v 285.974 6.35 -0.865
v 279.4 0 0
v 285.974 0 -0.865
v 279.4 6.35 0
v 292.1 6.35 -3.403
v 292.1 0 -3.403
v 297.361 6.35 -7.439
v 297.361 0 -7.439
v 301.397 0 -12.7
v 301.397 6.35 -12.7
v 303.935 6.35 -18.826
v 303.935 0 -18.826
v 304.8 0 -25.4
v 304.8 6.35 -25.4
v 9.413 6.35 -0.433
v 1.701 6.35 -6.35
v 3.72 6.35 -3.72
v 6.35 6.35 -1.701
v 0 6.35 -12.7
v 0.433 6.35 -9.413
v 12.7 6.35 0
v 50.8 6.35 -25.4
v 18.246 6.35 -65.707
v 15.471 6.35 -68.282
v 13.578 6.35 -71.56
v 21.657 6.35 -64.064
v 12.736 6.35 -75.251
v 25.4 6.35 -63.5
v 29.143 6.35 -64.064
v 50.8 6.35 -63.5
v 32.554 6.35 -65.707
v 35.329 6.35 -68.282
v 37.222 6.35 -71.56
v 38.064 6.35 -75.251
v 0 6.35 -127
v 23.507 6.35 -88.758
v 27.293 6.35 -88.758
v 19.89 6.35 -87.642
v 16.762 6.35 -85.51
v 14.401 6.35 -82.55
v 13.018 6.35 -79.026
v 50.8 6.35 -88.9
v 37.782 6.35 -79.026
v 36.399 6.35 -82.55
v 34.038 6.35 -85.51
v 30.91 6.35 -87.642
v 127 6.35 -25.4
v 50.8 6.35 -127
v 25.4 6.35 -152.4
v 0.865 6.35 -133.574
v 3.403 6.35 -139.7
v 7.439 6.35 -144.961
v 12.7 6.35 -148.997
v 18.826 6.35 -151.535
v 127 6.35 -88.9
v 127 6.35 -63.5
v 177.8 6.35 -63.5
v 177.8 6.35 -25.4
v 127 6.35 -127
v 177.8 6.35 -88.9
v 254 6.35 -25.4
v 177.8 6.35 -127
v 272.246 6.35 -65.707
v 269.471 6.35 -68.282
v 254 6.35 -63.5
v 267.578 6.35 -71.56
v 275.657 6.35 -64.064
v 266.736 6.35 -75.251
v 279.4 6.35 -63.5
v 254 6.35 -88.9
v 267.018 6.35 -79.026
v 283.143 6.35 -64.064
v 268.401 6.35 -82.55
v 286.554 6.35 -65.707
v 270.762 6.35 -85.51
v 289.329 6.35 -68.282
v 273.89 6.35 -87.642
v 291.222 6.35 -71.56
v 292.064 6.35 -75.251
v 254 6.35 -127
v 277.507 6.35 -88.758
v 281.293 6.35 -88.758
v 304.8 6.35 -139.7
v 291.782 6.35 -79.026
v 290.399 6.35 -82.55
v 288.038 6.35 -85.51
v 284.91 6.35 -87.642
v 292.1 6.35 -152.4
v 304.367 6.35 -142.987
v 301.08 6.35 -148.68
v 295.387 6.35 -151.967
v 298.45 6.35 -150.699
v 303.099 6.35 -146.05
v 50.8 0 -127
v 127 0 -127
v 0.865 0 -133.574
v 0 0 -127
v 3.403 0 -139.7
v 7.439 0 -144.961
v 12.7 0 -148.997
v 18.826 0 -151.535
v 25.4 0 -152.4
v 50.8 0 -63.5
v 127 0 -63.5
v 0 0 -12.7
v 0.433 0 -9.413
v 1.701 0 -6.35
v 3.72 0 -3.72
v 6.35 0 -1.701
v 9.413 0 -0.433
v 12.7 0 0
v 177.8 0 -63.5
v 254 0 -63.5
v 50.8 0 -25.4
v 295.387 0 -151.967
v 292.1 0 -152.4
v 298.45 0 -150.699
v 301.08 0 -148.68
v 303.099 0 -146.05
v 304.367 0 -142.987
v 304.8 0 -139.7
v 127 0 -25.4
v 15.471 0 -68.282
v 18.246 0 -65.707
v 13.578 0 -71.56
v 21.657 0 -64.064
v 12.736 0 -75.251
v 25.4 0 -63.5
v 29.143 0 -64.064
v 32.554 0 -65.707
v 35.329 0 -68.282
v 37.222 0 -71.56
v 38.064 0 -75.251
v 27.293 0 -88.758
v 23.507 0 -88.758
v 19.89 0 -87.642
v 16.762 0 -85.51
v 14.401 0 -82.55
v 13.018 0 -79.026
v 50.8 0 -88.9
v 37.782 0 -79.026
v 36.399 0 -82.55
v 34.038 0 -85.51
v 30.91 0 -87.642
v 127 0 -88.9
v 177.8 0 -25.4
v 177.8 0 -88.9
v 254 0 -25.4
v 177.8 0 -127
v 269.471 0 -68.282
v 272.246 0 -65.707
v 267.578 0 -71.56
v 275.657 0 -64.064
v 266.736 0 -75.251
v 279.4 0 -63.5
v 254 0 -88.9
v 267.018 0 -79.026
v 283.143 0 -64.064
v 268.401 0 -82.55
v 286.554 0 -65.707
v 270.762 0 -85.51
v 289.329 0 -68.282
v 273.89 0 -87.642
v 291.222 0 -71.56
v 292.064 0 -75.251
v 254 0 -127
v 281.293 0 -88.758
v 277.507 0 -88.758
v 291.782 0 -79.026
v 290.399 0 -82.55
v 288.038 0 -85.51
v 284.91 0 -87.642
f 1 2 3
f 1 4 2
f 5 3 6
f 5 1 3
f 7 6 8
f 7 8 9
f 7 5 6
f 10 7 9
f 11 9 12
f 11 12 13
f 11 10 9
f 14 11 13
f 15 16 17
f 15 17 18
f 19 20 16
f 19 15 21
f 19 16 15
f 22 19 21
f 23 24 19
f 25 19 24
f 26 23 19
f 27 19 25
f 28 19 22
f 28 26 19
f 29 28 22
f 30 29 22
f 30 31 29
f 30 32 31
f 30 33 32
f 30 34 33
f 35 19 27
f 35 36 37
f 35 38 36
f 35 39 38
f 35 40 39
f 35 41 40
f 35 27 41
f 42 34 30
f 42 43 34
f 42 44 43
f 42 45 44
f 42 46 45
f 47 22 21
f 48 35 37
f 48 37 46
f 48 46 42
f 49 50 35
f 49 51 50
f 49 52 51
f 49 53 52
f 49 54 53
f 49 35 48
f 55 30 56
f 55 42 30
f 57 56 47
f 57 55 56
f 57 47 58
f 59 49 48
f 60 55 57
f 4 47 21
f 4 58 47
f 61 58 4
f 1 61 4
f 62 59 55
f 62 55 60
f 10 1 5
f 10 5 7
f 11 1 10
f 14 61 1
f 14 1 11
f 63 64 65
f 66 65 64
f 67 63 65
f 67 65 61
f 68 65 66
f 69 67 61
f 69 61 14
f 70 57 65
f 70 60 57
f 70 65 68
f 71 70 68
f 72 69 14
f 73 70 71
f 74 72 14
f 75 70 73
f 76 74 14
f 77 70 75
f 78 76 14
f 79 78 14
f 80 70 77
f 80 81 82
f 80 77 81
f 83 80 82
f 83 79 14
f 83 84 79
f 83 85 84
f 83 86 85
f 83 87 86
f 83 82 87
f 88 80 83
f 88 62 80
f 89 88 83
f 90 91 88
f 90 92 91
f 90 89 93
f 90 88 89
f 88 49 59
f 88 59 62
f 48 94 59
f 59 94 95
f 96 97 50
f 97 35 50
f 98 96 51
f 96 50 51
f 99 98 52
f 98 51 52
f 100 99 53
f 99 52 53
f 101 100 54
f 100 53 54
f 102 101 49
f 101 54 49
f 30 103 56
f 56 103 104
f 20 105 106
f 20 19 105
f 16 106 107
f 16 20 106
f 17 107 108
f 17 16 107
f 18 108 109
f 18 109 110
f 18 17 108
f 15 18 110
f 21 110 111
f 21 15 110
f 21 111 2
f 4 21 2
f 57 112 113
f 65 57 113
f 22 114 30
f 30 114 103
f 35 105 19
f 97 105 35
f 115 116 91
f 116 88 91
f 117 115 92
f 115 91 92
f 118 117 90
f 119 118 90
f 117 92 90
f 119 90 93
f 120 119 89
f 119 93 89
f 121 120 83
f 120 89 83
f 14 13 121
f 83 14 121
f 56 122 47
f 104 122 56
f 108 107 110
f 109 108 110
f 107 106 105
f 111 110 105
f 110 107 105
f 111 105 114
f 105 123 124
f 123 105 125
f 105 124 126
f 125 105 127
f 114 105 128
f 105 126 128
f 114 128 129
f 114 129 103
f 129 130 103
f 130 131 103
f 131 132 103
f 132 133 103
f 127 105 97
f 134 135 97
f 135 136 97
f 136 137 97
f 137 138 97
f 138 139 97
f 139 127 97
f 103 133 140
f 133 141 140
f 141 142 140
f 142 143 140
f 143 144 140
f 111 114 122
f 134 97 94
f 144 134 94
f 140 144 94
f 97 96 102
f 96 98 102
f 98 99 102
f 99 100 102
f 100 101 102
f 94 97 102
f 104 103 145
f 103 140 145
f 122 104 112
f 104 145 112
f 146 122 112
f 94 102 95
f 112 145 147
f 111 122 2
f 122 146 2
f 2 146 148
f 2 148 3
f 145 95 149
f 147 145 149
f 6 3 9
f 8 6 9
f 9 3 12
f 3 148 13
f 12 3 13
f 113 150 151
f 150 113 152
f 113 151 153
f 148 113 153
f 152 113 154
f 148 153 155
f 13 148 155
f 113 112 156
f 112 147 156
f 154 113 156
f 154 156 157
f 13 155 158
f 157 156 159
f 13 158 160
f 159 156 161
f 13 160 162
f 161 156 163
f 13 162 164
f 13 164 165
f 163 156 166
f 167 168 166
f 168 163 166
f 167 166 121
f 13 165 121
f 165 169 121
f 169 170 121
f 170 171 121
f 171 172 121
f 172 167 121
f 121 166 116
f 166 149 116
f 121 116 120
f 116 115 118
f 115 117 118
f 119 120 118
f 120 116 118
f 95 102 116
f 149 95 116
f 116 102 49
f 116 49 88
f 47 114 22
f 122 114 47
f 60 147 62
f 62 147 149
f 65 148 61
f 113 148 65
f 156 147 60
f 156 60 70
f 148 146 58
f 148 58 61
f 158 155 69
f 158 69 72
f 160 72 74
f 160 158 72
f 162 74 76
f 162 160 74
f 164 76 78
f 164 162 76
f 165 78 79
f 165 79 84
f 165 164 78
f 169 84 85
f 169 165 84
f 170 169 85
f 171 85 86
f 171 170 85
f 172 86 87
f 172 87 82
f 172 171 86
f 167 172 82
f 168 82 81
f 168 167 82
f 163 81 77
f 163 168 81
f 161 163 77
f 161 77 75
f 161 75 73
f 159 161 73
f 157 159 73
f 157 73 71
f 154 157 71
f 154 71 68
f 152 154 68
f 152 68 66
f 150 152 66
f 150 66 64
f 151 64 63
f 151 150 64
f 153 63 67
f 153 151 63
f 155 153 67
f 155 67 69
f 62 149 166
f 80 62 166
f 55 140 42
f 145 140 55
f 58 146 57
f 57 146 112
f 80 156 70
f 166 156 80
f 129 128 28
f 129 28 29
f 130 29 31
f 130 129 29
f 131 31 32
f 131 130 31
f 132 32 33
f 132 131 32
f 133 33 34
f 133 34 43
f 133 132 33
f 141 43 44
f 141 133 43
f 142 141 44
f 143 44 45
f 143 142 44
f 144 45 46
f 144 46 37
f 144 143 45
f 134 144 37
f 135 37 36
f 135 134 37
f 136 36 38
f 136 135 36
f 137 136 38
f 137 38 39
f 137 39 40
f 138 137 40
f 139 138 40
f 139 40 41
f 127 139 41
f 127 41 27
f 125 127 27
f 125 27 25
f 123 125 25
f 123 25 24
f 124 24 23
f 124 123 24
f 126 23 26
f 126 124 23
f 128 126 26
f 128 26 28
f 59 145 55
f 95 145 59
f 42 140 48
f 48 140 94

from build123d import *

# Parameters (mm, degrees)
SKETCH1_W           = 304.8
SKETCH1_H           = 152.4
SKETCH1_R           = 12.7
SKETCH1_W_2         = 76.2
SKETCH1_H_2         = 38.1
BOSS_EXTRUDE1_DEPTH = 6.35
FILLET2_R           = 25.4
FILLET3_R           = 12.7


with BuildPart() as part:
    # Sketch1 → Boss-Extrude1 (new body)
    with BuildSketch(Plane(origin=(0, 0, 0), x_dir=(1, 0, 0), z_dir=(0, 1, 0))):
        with Locations((152.4, 76.2)):
            Rectangle(SKETCH1_W, SKETCH1_H)
        with Locations(Location((25.4, 76.2, 0), (0, 0, 270))):
            Circle(SKETCH1_R, mode=Mode.SUBTRACT)
        with Locations(Location((279.4, 76.2, 0), (0, 0, 270))):
            Circle(SKETCH1_R, mode=Mode.SUBTRACT)
        with Locations((88.9, 107.95)):
            Rectangle(SKETCH1_W_2, SKETCH1_H_2, mode=Mode.SUBTRACT)
        with Locations((88.9, 44.45)):
            Rectangle(SKETCH1_W_2, SKETCH1_H_2, mode=Mode.SUBTRACT)
        with Locations((215.9, 107.95)):
            Rectangle(SKETCH1_W_2, SKETCH1_H_2, mode=Mode.SUBTRACT)
        with Locations((215.9, 44.45)):
            Rectangle(SKETCH1_W_2, SKETCH1_H_2, mode=Mode.SUBTRACT)
    extrude(amount=BOSS_EXTRUDE1_DEPTH)

    # Fillet2
    fillet2_edges = [part.edges().sort_by_distance(p)[0] for p in [
        (0, 3.175, -152.4),
        (304.8, 3.175, 0),
    ]]
    fillet(fillet2_edges, radius=FILLET2_R)

    # Fillet3
    fillet3_edges = [part.edges().sort_by_distance(p)[0] for p in [
        (304.8, 3.175, -152.4),
        (0, 3.175, 0),
    ]]
    fillet(fillet3_edges, radius=FILLET3_R)


solid = part.part
